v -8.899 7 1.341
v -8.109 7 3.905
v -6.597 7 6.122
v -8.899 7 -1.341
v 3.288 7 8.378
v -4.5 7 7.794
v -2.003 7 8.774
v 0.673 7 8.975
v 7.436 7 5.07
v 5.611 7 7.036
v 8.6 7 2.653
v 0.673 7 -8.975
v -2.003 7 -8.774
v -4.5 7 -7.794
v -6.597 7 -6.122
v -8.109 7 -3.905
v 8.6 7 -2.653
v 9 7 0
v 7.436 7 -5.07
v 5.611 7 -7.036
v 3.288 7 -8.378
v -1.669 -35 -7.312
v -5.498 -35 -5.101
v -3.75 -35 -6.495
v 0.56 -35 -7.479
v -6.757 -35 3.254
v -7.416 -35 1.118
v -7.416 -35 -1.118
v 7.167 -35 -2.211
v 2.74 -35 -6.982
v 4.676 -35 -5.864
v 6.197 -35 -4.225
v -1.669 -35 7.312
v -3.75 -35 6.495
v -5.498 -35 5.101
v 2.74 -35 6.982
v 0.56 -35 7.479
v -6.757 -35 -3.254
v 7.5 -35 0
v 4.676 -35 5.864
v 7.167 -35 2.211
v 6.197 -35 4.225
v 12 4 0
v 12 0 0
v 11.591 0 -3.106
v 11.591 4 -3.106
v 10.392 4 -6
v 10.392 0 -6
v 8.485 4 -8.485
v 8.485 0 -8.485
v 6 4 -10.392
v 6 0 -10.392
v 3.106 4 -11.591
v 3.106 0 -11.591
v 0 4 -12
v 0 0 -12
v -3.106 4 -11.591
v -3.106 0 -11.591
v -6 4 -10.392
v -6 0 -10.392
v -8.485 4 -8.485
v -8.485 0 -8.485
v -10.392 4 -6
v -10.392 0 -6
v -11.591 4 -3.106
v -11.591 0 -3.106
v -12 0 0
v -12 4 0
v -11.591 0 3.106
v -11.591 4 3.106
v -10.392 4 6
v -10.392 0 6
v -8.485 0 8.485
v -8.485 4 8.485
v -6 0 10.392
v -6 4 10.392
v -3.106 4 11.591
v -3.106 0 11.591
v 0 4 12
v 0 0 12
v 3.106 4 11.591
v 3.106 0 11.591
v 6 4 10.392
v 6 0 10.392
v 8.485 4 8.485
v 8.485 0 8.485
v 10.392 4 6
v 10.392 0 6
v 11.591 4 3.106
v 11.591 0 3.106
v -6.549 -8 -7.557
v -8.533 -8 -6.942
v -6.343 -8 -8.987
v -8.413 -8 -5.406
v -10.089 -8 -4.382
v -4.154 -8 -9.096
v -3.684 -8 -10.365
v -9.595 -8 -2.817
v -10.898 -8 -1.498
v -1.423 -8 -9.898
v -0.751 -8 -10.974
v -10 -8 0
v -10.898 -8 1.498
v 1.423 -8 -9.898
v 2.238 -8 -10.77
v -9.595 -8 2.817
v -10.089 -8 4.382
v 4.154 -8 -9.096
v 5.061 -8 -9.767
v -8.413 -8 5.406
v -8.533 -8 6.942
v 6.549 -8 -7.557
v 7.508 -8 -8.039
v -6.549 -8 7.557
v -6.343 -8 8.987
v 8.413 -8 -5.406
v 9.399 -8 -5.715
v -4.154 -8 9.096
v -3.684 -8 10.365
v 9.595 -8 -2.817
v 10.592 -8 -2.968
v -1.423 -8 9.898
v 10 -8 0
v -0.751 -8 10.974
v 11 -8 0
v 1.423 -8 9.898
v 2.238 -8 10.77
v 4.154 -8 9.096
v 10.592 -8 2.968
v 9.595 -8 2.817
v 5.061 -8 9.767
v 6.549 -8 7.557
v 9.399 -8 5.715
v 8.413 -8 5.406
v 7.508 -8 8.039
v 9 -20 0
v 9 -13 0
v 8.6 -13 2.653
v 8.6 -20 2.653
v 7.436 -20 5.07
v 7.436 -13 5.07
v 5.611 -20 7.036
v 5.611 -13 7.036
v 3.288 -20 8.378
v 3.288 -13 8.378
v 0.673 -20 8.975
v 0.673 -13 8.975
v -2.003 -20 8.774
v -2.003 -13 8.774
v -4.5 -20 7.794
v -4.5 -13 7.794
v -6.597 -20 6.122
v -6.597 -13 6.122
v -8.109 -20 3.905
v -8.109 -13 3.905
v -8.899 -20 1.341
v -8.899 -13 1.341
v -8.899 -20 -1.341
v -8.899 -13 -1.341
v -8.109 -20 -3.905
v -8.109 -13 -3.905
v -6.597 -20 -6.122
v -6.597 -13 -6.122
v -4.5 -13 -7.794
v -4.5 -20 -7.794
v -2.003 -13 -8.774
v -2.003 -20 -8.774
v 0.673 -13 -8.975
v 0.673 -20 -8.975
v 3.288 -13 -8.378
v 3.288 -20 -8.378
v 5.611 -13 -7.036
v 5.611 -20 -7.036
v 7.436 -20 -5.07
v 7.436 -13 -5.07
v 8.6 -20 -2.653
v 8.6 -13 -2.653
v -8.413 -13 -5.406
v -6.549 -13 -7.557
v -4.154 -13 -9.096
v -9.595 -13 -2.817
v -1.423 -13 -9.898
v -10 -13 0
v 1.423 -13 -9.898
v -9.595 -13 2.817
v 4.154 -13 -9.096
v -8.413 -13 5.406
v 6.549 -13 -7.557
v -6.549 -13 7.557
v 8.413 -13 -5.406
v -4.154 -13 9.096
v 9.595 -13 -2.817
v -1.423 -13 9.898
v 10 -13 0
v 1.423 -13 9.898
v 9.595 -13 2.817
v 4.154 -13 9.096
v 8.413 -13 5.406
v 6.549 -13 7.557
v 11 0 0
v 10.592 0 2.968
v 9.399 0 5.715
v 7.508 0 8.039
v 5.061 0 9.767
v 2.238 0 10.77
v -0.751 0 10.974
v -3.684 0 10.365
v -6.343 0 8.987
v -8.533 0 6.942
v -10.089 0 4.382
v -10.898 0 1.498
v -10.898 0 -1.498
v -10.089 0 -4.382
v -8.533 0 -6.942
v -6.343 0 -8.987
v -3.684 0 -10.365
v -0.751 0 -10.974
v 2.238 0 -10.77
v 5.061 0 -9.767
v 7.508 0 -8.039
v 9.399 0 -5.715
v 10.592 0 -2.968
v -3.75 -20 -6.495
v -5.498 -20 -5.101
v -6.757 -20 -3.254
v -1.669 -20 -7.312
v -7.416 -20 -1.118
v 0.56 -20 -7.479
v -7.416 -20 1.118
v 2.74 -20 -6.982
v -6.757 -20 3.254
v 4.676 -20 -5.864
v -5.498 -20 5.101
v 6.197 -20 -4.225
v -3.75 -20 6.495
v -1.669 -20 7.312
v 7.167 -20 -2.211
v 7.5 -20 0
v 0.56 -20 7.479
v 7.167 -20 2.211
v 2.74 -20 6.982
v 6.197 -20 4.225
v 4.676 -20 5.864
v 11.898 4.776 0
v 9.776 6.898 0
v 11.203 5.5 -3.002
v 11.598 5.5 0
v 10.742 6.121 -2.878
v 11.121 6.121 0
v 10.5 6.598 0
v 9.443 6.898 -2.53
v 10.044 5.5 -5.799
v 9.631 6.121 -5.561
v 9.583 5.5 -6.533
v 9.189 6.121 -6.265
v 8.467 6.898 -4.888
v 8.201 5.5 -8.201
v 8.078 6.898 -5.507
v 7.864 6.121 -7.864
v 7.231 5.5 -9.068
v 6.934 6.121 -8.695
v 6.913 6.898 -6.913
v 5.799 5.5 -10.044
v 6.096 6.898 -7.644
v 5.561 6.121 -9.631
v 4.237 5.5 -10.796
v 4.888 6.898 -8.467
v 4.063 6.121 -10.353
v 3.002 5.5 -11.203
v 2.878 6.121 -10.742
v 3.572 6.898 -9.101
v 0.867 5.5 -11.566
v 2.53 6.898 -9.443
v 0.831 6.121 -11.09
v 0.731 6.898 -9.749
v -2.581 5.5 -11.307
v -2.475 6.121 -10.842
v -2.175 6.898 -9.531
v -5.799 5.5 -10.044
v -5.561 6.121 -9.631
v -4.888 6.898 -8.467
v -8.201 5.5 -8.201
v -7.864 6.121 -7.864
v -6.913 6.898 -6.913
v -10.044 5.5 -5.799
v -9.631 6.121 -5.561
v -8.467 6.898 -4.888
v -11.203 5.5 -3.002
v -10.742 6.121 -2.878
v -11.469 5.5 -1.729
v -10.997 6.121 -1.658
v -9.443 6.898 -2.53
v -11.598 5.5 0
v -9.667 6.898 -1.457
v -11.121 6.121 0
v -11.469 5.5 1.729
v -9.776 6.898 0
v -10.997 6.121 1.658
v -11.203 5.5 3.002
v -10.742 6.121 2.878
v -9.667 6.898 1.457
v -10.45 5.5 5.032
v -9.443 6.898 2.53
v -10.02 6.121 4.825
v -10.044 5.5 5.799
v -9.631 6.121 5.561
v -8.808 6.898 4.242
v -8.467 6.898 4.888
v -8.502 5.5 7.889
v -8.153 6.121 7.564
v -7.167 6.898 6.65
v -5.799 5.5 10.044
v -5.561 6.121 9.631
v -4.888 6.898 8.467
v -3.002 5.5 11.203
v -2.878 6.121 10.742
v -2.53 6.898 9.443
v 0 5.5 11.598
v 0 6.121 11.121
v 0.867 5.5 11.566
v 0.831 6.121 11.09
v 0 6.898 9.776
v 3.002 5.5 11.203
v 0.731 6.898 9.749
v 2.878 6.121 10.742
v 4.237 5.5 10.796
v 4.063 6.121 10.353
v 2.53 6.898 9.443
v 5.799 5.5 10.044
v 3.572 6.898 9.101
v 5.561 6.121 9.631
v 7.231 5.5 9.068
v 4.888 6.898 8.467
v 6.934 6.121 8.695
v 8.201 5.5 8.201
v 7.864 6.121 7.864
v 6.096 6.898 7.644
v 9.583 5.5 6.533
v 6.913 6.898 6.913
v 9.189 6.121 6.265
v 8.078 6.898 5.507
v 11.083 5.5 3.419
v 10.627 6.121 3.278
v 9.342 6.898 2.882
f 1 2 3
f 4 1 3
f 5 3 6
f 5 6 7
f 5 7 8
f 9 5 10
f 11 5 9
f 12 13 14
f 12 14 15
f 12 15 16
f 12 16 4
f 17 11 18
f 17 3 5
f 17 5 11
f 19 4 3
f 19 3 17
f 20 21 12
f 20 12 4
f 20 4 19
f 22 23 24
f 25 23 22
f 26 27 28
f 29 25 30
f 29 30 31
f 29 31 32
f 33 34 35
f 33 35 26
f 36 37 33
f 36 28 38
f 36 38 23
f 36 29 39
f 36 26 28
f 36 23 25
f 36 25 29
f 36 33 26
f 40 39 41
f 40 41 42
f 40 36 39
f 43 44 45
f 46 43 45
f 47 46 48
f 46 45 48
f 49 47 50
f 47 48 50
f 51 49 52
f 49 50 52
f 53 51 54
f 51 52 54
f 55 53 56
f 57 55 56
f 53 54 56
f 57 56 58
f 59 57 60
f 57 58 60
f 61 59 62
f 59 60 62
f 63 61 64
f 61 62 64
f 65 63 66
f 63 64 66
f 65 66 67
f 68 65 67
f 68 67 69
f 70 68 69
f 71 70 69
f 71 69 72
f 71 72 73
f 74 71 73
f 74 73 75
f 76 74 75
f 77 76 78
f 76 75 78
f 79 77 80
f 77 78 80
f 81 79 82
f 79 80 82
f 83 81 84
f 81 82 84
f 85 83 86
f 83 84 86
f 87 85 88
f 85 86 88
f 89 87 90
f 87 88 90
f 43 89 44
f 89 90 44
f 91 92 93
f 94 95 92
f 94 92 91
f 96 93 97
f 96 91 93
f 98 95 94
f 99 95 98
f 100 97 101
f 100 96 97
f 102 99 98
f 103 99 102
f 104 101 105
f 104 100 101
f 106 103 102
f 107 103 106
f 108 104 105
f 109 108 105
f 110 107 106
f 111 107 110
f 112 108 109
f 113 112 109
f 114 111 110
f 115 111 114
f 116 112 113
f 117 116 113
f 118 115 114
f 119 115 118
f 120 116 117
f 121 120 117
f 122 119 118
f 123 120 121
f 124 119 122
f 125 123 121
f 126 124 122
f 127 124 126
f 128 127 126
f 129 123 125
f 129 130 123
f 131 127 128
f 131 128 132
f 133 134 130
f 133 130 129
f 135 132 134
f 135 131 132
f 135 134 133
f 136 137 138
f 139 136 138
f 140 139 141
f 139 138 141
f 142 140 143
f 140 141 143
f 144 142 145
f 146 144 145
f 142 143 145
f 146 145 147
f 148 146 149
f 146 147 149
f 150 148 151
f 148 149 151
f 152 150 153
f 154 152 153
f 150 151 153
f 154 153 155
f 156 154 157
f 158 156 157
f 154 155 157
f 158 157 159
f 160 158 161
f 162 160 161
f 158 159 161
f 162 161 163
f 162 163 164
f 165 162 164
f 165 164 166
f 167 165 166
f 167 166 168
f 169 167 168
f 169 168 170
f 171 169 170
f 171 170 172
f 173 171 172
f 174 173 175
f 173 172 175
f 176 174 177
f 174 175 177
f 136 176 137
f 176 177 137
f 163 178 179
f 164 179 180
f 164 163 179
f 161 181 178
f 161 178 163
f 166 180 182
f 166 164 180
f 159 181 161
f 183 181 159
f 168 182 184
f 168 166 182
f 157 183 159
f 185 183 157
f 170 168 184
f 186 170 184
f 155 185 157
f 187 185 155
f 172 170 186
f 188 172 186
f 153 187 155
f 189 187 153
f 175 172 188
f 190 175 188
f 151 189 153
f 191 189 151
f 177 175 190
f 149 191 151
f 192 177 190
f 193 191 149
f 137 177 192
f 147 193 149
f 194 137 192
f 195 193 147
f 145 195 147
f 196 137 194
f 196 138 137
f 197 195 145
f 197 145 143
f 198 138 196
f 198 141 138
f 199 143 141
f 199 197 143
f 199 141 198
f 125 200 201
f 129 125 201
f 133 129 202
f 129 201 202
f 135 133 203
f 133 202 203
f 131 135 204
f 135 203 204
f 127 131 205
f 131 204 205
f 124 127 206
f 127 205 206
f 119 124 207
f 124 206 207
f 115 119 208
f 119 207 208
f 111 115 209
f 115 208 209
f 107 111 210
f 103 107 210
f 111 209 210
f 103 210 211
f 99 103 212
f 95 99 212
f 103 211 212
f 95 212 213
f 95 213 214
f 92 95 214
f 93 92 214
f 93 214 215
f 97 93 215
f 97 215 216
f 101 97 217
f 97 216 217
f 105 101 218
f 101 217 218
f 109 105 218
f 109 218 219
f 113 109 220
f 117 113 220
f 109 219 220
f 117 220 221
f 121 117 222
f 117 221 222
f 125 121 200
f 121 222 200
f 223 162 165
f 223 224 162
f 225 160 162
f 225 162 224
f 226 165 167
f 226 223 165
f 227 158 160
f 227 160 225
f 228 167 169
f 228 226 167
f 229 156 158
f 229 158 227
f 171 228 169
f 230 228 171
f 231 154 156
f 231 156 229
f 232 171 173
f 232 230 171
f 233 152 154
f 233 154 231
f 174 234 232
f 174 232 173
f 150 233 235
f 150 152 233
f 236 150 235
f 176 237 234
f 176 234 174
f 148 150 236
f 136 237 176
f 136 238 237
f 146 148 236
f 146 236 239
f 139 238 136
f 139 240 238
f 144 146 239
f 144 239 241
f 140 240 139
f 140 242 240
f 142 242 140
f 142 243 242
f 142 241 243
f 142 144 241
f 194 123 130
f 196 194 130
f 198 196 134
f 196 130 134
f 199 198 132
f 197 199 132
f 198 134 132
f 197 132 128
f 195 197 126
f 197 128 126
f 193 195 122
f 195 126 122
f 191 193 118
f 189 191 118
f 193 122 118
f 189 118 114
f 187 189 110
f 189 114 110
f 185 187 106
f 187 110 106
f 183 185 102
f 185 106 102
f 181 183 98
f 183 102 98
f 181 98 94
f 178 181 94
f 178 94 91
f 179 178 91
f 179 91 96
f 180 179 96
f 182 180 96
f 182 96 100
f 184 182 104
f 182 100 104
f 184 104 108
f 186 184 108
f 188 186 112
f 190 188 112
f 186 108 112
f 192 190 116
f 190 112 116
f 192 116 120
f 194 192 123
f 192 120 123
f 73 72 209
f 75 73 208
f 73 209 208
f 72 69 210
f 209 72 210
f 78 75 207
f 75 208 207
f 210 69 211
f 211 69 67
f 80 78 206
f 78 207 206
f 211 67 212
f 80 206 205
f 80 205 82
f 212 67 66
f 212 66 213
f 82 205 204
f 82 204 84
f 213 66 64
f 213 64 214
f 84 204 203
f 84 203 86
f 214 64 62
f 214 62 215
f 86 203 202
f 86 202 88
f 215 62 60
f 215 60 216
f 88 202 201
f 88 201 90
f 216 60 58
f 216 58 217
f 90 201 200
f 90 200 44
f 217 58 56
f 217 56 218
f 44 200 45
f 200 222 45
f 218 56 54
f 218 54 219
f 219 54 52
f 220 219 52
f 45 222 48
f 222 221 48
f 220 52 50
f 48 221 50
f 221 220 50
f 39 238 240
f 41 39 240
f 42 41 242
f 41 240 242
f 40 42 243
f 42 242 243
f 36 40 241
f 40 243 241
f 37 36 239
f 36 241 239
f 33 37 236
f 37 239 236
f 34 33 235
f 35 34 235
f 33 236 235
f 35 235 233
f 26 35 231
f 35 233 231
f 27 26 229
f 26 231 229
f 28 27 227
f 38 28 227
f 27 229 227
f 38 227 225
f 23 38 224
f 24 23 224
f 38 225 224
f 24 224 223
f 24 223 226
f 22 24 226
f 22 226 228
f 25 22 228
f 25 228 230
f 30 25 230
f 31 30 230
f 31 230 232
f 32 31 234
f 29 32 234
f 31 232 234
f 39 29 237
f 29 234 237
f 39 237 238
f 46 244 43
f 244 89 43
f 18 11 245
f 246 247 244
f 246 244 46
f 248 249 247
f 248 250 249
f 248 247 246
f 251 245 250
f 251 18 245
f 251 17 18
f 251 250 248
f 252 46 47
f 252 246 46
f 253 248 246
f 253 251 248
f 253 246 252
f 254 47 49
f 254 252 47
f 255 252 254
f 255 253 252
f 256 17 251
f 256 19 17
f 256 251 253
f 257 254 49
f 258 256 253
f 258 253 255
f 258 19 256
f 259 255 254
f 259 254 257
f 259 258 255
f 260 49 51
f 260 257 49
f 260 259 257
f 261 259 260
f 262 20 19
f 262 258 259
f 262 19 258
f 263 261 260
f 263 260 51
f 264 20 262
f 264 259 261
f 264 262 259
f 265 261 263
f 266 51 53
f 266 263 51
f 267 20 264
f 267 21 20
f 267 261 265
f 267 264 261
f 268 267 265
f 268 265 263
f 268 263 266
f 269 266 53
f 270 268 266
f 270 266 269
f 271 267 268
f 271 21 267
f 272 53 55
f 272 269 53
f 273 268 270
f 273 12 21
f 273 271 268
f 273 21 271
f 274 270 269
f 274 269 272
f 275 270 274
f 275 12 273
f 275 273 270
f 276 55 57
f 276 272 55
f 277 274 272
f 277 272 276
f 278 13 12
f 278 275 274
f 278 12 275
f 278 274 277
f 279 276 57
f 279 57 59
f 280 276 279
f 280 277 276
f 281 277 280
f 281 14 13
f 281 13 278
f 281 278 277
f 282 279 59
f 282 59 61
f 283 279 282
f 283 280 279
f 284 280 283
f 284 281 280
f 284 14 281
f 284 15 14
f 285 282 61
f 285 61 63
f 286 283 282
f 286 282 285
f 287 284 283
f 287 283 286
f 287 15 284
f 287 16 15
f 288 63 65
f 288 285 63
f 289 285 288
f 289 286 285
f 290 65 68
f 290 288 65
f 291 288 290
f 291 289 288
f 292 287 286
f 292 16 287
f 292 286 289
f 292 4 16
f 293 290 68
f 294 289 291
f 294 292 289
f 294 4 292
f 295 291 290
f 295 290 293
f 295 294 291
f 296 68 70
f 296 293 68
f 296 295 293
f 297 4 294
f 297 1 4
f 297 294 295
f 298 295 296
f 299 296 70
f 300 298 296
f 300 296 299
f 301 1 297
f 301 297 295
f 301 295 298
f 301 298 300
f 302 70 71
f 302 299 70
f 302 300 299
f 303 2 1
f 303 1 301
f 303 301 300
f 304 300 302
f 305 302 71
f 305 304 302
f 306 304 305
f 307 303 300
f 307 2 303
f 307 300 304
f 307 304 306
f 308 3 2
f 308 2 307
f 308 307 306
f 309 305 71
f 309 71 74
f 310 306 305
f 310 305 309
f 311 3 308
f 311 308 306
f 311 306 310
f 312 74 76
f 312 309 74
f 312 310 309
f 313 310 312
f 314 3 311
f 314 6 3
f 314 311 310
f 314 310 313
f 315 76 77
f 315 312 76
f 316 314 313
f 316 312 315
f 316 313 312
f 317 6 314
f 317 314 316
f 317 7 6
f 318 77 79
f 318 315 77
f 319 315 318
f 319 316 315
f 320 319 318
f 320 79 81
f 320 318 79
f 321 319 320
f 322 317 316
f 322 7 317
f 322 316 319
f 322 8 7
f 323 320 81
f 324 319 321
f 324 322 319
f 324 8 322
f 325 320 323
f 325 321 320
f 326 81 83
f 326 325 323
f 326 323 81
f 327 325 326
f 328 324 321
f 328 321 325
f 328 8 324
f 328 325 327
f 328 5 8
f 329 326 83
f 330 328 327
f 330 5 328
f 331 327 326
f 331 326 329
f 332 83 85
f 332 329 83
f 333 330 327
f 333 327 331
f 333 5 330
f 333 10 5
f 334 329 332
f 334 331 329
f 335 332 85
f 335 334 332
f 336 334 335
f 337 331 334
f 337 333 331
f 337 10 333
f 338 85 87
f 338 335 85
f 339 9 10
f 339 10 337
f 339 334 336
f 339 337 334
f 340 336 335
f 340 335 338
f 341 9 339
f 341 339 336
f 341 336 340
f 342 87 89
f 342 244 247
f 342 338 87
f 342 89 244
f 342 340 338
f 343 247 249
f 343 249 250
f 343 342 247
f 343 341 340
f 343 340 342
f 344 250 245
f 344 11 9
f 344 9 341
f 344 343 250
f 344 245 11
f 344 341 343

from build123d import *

# Parameters (mm, degrees)
ESQUISSE1_R      = 12
EXTRUSION1_DEPTH = 7
ESQUISSE2_R      = 11
EXTRUSION2_DEPTH = 8
CONG_1_R         = 3
ESQUISSE3_R      = 10
EXTRUSION3_DEPTH = 5
ESQUISSE4_R      = 9
EXTRUSION4_DEPTH = 7
ESQUISSE5_R      = 7.5
EXTRUSION5_DEPTH = 15


with BuildPart() as part:
    # Esquisse1 → Extrusion1 (new body)
    with BuildSketch(Plane(origin=(0, 0, 0), x_dir=(1, 0, 0), z_dir=(0, 1, 0))):
        Circle(ESQUISSE1_R)
    extrude(amount=EXTRUSION1_DEPTH)

    # Esquisse2 → Extrusion2 (add)
    with BuildSketch(Plane.XZ):
        Circle(ESQUISSE2_R)
    extrude(amount=EXTRUSION2_DEPTH)

    # Congé1
    cong_1_edges = [part.edges().sort_by_distance(p)[0] for p in [
        (-12, 7, 0),
    ]]
    fillet(cong_1_edges, radius=CONG_1_R)

    # Esquisse3 → Extrusion3 (add)
    with BuildSketch(Plane.XZ.offset(8)):
        Circle(ESQUISSE3_R)
    extrude(amount=EXTRUSION3_DEPTH)

    # Esquisse4 → Extrusion4 (add)
    with BuildSketch(Plane.XZ.offset(13)):
        Circle(ESQUISSE4_R)
    extrude(amount=EXTRUSION4_DEPTH)

    # Esquisse5 → Extrusion5 (add)
    with BuildSketch(Plane.XZ.offset(20)):
        Circle(ESQUISSE5_R)
    extrude(amount=EXTRUSION5_DEPTH)


solid = part.part
